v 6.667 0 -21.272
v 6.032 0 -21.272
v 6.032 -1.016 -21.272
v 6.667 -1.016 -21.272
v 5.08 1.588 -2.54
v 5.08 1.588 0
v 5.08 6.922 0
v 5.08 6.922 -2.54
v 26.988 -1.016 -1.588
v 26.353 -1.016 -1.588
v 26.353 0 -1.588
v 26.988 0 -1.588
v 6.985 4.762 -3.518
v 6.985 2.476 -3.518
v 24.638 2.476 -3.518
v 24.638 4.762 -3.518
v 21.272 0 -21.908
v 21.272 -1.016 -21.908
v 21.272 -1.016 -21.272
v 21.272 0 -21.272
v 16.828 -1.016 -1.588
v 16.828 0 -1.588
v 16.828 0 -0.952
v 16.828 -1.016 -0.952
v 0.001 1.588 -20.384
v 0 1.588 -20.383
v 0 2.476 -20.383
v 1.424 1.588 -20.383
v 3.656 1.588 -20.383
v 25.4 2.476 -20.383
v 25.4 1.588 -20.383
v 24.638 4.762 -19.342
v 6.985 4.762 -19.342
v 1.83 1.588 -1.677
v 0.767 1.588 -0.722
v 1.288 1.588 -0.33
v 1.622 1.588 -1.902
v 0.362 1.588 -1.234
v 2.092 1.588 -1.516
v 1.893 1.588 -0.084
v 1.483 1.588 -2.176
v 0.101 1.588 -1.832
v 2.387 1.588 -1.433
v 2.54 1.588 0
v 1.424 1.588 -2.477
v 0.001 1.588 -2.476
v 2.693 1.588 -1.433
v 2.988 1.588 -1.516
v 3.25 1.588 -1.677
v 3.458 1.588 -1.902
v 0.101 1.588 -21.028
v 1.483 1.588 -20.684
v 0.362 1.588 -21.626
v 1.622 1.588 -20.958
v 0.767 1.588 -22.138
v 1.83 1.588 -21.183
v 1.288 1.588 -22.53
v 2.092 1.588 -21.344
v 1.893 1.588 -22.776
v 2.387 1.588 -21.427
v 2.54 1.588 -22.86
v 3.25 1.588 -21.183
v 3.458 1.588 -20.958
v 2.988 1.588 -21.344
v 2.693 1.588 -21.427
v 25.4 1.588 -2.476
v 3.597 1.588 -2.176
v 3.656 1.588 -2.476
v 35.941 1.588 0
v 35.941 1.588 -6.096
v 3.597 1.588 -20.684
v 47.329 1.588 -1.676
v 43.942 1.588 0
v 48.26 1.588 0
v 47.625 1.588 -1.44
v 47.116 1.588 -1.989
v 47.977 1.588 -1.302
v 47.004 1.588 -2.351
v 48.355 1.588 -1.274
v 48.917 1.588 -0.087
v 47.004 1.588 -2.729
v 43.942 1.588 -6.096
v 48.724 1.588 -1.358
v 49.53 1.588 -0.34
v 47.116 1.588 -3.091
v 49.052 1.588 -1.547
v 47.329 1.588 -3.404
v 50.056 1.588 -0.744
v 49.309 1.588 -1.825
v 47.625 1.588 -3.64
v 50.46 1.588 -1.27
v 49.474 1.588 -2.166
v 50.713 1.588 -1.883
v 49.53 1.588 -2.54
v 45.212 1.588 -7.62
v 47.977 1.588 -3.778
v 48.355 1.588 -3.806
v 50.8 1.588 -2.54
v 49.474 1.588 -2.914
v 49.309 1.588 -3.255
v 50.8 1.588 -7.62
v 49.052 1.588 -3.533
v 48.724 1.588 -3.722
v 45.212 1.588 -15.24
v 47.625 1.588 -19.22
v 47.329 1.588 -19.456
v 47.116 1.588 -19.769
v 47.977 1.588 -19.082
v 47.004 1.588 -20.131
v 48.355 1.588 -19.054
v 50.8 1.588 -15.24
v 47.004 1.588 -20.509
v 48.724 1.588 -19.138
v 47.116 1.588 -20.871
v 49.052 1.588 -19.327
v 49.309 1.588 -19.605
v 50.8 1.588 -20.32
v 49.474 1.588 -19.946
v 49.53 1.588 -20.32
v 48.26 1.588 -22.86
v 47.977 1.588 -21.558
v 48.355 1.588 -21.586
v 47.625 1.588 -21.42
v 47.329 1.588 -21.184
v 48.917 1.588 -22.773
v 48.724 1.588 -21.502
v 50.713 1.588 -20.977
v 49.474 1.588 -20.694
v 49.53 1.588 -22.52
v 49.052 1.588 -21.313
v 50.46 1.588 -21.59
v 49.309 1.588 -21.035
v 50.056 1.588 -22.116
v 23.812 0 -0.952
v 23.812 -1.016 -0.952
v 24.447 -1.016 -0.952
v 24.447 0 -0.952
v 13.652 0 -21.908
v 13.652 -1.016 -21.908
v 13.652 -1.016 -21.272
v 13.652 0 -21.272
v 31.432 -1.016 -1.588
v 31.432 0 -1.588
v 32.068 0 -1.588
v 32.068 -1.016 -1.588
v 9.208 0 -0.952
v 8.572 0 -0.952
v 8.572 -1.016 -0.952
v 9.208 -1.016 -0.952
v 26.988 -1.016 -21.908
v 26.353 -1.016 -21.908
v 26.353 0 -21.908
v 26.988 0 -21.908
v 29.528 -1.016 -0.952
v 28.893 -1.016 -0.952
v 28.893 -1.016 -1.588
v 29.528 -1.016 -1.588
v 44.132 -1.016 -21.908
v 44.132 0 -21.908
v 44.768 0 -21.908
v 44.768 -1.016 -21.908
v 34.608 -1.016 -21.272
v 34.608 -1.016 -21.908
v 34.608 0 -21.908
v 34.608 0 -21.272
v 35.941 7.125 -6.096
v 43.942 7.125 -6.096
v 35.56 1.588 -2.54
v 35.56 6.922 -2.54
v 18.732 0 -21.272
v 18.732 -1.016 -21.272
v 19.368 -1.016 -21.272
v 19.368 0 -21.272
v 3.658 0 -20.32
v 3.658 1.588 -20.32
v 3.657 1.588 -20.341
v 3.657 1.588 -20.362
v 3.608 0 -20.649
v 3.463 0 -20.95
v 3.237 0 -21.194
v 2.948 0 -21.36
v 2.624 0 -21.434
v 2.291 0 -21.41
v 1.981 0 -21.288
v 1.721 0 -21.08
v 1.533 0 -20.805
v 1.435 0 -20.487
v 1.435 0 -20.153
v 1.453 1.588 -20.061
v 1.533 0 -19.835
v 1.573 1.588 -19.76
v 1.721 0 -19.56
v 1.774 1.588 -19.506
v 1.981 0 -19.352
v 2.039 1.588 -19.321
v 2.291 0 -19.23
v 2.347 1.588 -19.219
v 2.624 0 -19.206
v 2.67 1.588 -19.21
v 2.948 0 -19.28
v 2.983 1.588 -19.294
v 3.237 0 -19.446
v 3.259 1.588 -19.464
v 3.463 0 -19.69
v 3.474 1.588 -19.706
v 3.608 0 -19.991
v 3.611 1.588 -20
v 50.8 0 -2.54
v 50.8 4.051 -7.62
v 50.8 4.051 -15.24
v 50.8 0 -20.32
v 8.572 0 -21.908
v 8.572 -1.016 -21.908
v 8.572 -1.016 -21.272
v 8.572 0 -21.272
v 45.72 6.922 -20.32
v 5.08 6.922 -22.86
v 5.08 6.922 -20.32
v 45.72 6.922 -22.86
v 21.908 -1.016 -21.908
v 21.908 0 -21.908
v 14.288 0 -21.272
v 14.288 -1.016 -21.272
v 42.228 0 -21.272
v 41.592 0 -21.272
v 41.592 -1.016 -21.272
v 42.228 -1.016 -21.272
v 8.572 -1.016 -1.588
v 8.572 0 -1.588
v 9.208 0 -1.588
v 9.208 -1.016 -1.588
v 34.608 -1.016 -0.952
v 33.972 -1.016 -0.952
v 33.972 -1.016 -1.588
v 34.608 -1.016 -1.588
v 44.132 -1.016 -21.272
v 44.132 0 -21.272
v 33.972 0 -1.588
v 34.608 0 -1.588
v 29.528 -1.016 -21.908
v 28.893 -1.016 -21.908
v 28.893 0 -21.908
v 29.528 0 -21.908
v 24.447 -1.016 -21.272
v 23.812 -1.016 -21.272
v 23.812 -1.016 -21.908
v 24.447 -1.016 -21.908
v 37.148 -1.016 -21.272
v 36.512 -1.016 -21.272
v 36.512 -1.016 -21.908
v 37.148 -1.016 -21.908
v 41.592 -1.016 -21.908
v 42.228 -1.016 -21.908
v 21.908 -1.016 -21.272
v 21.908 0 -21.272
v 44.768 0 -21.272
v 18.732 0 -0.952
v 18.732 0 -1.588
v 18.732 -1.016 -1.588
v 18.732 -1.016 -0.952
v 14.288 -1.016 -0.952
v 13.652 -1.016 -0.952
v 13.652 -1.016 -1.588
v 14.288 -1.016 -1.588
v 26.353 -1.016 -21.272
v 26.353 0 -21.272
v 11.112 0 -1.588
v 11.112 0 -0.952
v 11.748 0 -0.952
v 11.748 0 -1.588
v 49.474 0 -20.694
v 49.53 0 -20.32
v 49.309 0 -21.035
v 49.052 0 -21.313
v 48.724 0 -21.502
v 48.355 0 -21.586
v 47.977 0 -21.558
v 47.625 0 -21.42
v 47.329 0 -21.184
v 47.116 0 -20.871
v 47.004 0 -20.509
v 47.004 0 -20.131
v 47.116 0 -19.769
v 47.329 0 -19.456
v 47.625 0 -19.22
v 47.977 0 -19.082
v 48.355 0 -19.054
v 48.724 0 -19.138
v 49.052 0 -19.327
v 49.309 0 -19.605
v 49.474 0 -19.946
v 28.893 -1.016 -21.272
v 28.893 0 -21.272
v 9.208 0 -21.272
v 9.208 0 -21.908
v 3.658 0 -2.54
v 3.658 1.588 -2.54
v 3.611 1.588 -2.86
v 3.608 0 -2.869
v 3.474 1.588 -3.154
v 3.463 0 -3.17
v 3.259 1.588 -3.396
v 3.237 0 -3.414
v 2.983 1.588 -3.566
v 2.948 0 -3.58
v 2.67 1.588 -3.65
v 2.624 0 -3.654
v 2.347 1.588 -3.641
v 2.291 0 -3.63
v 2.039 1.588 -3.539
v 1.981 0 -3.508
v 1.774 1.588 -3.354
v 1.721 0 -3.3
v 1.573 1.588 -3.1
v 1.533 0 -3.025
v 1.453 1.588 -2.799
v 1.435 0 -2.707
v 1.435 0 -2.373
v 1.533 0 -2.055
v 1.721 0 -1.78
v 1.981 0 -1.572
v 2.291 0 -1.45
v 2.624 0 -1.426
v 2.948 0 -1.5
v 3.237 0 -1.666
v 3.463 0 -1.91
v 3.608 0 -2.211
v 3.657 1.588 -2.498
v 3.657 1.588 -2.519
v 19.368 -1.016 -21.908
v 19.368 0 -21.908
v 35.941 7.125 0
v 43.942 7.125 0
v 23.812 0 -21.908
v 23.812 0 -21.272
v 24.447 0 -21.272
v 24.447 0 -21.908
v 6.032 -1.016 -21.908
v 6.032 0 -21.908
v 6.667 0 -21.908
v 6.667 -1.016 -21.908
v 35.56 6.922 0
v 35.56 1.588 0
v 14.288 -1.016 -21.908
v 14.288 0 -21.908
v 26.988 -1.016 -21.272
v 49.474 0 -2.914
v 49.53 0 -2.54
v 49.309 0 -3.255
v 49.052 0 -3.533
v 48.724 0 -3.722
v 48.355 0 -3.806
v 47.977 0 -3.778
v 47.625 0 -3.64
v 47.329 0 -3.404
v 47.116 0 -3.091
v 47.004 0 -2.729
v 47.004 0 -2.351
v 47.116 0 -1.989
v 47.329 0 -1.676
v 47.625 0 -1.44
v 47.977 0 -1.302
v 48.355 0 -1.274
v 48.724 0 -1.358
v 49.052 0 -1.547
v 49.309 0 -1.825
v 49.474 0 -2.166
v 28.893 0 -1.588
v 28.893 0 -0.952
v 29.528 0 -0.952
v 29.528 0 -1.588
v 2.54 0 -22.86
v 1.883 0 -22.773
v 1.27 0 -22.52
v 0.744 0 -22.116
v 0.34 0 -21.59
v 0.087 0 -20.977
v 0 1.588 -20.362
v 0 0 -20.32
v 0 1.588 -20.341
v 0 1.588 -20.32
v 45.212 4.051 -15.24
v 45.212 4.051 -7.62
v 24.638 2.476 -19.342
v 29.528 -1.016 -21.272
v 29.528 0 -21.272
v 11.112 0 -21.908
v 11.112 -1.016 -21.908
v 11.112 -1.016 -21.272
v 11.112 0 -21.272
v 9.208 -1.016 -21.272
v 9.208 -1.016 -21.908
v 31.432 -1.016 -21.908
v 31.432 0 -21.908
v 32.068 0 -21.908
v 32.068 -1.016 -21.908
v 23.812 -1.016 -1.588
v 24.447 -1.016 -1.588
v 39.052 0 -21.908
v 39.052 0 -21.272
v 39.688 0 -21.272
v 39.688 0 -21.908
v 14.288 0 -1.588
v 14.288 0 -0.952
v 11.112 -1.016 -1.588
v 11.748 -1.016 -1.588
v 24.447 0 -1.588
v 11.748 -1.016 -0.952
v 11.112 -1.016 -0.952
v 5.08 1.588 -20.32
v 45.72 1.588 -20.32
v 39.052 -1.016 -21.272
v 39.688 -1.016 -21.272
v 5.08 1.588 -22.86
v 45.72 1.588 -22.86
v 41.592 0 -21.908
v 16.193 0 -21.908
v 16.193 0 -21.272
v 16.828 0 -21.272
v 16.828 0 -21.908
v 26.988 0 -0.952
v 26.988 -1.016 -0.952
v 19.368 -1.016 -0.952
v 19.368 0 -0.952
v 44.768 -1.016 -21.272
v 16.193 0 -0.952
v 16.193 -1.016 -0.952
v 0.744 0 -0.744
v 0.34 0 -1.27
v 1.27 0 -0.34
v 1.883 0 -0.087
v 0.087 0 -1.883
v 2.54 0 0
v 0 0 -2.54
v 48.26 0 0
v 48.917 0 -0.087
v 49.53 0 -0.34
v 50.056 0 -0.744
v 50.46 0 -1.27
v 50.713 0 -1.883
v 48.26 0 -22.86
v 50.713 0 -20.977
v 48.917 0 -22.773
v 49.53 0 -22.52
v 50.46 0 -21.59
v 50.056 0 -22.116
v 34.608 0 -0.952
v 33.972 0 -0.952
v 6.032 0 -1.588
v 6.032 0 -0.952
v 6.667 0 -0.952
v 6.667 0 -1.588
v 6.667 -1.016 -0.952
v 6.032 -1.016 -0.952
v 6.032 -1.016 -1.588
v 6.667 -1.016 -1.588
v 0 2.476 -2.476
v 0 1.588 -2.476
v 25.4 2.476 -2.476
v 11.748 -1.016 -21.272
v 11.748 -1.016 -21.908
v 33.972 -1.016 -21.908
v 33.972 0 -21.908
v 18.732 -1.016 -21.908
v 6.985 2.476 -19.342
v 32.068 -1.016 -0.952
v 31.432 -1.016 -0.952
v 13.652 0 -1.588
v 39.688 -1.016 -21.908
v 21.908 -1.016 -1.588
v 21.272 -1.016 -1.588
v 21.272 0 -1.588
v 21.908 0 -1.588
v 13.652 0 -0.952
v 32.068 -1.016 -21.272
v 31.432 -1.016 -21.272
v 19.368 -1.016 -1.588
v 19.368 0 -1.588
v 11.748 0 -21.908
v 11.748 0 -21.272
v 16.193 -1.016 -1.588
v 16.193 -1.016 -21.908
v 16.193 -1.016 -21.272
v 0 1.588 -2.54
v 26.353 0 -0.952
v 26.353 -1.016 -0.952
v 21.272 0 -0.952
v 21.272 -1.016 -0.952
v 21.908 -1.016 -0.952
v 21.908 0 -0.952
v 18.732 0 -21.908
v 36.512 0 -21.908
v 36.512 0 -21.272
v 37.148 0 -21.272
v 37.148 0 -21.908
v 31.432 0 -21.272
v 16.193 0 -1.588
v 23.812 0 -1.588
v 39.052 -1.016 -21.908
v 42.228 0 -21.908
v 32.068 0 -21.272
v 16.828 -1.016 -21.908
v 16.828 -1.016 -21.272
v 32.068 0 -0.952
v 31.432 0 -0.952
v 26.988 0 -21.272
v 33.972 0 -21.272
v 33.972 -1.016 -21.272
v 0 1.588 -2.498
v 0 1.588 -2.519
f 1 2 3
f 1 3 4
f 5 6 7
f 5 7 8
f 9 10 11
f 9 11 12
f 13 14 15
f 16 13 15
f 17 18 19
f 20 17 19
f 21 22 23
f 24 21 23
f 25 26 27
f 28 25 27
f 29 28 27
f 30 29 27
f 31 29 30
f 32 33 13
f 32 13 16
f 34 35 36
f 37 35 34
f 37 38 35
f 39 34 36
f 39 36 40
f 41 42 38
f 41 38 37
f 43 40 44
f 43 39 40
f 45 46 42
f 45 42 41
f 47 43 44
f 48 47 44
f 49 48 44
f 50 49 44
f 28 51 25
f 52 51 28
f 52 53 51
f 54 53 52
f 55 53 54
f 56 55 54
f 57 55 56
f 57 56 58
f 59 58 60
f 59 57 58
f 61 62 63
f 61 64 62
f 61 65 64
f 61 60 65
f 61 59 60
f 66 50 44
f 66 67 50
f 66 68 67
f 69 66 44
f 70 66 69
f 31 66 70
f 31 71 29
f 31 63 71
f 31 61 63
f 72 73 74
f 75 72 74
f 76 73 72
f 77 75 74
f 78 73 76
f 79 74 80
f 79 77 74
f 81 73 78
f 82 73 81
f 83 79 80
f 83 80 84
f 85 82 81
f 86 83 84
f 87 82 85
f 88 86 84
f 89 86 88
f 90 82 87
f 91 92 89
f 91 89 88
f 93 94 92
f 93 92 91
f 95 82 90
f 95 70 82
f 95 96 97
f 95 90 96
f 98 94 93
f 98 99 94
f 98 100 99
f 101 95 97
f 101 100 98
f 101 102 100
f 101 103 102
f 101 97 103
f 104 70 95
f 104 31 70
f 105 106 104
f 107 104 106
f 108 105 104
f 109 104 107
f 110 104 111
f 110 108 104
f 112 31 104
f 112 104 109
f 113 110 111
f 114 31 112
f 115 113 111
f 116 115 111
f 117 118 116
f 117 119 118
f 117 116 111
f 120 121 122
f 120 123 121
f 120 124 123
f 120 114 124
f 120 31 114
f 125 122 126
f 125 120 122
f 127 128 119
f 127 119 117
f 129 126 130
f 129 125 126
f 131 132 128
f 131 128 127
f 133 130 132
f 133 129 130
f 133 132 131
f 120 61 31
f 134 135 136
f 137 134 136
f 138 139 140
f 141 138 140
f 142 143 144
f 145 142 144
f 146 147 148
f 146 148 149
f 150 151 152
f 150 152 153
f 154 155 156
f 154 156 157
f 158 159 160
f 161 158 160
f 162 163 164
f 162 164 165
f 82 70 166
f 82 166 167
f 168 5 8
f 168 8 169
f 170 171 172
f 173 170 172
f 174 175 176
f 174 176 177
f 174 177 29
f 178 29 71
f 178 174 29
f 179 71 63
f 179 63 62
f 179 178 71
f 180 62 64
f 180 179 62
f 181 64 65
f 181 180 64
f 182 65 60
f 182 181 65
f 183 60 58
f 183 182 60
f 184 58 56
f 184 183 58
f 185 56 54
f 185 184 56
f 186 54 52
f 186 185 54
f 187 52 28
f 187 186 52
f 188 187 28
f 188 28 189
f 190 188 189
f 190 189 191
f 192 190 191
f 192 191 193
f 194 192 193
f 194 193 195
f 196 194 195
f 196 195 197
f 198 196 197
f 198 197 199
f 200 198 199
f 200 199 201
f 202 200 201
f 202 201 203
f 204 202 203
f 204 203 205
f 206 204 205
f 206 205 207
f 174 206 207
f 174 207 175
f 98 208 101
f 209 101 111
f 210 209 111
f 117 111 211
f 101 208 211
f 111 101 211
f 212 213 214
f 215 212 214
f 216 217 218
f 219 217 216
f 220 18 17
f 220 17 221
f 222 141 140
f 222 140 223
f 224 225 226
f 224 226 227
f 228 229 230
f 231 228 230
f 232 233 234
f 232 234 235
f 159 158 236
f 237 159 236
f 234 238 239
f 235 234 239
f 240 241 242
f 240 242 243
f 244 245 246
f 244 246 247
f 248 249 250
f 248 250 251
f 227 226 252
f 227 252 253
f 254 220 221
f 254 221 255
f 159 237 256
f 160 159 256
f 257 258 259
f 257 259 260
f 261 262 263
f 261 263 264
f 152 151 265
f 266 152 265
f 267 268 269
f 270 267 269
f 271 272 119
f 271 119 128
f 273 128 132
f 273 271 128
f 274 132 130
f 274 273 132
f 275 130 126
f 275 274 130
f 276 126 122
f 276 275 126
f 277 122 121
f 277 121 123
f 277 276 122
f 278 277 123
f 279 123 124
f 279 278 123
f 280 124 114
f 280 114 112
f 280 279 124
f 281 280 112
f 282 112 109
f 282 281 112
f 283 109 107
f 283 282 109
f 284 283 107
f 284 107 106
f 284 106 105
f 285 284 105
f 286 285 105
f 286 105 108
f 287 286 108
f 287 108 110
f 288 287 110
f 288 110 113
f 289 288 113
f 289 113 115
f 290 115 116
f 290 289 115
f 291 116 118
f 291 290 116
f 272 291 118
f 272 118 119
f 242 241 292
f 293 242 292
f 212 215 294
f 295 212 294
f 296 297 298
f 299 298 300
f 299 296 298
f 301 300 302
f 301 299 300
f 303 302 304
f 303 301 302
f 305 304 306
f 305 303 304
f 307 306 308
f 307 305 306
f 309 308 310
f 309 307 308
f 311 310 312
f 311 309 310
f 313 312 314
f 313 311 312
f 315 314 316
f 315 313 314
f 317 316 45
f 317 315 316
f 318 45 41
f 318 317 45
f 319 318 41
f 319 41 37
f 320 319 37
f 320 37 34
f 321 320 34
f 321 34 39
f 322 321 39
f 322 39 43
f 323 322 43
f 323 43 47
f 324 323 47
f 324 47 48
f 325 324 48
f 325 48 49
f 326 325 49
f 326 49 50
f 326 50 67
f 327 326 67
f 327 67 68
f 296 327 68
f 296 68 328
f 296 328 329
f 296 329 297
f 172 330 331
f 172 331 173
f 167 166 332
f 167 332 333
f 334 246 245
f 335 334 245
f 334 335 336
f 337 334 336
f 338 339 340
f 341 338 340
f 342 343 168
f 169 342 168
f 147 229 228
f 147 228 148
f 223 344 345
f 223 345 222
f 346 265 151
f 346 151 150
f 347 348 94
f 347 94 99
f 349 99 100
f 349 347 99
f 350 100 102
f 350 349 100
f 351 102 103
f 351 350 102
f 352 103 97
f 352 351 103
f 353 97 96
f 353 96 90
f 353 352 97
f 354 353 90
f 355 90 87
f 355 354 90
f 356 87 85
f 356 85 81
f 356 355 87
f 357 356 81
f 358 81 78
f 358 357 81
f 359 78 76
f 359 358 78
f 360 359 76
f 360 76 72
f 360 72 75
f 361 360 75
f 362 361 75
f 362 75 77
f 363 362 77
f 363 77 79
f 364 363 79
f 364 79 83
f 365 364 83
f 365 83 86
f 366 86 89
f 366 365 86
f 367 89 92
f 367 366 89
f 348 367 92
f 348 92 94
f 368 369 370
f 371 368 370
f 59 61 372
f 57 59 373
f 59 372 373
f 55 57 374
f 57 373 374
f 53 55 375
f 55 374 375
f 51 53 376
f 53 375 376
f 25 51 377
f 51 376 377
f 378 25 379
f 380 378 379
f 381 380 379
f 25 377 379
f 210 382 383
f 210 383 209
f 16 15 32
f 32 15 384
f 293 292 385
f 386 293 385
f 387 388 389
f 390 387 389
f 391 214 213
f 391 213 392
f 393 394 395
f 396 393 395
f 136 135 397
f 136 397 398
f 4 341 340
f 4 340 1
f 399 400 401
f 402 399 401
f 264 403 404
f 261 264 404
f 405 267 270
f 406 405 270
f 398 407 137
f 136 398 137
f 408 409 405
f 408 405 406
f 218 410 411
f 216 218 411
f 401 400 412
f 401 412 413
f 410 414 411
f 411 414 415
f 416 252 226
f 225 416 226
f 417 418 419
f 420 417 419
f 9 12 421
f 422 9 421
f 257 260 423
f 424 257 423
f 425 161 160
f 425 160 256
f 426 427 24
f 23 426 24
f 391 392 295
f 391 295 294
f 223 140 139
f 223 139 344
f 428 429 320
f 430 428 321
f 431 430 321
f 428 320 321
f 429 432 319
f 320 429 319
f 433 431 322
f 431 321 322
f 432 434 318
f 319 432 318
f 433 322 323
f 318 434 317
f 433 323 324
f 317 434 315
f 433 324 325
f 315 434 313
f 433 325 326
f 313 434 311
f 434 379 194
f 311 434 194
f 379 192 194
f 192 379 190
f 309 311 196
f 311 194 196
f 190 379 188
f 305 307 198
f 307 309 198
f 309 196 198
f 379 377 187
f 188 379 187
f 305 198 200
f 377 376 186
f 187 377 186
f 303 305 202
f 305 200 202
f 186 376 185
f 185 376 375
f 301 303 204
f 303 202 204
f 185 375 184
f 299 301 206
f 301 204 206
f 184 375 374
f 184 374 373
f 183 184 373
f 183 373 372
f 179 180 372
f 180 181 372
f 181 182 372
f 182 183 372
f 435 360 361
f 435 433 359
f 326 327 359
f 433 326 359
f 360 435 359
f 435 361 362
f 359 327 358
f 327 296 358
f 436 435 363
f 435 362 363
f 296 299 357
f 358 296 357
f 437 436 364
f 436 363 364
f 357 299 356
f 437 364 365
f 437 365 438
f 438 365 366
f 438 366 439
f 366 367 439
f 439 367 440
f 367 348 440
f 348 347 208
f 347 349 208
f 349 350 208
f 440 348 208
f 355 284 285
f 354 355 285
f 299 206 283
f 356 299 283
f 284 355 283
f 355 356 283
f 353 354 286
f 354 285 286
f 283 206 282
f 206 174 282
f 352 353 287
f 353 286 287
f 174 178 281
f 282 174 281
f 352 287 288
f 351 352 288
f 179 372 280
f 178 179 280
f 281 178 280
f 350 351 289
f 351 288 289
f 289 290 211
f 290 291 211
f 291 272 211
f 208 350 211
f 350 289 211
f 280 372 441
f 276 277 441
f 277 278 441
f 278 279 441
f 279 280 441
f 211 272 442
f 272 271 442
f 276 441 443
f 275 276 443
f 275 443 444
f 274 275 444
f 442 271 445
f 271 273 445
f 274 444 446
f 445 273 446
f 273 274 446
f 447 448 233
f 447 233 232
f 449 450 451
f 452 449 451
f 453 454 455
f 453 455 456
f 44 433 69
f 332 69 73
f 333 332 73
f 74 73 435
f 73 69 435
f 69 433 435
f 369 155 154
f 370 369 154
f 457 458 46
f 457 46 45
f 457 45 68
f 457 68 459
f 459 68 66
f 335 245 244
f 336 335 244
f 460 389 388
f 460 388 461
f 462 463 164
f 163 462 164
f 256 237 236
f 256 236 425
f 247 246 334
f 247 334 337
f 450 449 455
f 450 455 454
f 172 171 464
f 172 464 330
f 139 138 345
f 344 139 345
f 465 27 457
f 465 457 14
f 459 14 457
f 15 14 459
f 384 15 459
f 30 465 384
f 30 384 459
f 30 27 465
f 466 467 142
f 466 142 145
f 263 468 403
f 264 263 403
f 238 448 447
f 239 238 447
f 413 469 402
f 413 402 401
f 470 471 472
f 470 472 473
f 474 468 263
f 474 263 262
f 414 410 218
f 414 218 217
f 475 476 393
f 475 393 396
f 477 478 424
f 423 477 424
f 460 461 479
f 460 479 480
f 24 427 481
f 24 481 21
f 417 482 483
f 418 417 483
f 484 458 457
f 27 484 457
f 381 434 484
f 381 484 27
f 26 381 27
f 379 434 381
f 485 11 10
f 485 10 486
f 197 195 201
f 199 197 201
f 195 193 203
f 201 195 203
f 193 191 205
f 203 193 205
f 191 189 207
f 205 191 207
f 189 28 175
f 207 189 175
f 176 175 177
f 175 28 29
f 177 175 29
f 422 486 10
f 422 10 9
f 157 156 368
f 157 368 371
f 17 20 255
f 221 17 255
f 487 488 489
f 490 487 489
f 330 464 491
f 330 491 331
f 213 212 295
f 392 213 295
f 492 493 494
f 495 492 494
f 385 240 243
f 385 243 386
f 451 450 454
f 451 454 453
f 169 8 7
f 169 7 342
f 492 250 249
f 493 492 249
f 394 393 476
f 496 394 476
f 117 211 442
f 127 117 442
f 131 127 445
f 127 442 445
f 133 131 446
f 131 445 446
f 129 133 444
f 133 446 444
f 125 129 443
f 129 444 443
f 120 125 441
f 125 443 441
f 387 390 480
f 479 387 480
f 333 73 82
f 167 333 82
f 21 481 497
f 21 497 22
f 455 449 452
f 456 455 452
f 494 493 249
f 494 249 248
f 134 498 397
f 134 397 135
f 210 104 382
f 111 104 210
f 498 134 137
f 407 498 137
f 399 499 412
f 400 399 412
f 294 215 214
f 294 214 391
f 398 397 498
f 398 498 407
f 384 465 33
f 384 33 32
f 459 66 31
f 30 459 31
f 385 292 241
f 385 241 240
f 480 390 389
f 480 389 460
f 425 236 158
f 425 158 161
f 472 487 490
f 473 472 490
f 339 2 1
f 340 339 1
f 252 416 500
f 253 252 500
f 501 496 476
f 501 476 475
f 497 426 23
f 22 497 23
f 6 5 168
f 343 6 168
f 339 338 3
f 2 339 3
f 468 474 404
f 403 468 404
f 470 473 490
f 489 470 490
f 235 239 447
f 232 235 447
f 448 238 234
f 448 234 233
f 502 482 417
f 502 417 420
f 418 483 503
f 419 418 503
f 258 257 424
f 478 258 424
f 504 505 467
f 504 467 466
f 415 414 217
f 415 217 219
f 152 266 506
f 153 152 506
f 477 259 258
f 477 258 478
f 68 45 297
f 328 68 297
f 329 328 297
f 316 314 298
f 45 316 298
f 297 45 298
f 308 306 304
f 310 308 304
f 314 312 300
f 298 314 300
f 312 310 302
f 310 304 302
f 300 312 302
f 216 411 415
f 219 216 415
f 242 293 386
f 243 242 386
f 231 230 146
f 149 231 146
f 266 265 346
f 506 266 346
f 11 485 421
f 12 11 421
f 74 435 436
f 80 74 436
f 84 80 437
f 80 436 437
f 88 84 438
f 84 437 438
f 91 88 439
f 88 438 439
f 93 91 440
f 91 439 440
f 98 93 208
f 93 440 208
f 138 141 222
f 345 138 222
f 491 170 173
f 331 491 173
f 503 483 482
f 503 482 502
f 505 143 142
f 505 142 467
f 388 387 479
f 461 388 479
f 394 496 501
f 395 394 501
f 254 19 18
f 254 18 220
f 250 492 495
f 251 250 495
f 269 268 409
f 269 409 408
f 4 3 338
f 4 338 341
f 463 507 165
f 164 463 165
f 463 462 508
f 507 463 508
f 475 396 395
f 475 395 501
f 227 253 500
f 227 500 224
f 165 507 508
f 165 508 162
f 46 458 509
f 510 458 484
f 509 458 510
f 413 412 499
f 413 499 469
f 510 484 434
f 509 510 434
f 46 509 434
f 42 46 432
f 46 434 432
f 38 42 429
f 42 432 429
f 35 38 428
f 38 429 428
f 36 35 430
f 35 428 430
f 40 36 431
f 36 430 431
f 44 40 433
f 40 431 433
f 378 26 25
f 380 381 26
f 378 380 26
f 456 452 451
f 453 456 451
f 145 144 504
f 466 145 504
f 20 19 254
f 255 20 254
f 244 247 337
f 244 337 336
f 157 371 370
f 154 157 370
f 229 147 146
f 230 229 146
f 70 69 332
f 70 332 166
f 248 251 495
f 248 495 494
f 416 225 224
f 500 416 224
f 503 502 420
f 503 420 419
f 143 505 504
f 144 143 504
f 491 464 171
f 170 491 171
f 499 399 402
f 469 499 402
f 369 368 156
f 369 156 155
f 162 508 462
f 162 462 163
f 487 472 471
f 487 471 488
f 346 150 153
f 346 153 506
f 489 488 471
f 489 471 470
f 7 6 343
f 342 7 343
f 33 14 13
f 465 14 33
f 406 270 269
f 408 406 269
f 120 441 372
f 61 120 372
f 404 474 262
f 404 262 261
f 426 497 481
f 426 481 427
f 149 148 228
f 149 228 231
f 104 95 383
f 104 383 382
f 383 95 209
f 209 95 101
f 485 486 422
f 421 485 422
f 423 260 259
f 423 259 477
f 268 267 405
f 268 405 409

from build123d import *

# Parameters (mm, degrees)
SKETCH1_R              = 1.27
SKETCH1_R_2            = 1.1176
BOSS_EXTRUDE1_DEPTH    = 1.5875
SKETCH2_W              = 25.4
SKETCH2_H              = 17.907
BOSS_EXTRUDE2_DEPTH    = 0.889
BOSS_EXTRUDE3_START    = 0.889
SKETCH2_3_W            = 17.653
SKETCH2_3_H            = 15.8242
BOSS_EXTRUDE3_DEPTH    = 2.286
SKETCH2_4_W            = 8.001
SKETCH2_4_H            = 6.096
BOSS_EXTRUDE4_DEPTH    = 5.5372
SKETCH2_5_W            = 5.588
SKETCH2_5_H            = 7.62
BOSS_EXTRUDE5_DEPTH    = 2.4638
SKETCH3_W              = 0.635
SKETCH3_H              = 0.635
BOSS_EXTRUDE6_DEPTH    = 1.016
BOSS_EXTRUDE6_2_DEPTH  = 1.016
BOSS_EXTRUDE6_3_DEPTH  = 1.016
BOSS_EXTRUDE6_4_DEPTH  = 1.016
BOSS_EXTRUDE6_5_DEPTH  = 1.016
BOSS_EXTRUDE6_6_DEPTH  = 1.016
BOSS_EXTRUDE6_7_DEPTH  = 1.016
BOSS_EXTRUDE6_8_DEPTH  = 1.016
BOSS_EXTRUDE6_9_DEPTH  = 1.016
BOSS_EXTRUDE6_10_DEPTH = 1.016
BOSS_EXTRUDE6_11_DEPTH = 1.016
BOSS_EXTRUDE6_12_DEPTH = 1.016
BOSS_EXTRUDE6_13_DEPTH = 1.016
BOSS_EXTRUDE6_14_DEPTH = 1.016
BOSS_EXTRUDE6_15_DEPTH = 1.016
BOSS_EXTRUDE6_16_DEPTH = 1.016
BOSS_EXTRUDE6_17_DEPTH = 1.016
BOSS_EXTRUDE6_18_DEPTH = 1.016
BOSS_EXTRUDE6_19_DEPTH = 1.016
BOSS_EXTRUDE6_20_DEPTH = 1.016
BOSS_EXTRUDE6_21_DEPTH = 1.016
BOSS_EXTRUDE6_22_DEPTH = 1.016
BOSS_EXTRUDE6_23_DEPTH = 1.016
BOSS_EXTRUDE6_24_DEPTH = 1.016
BOSS_EXTRUDE6_25_DEPTH = 1.016
BOSS_EXTRUDE6_26_DEPTH = 1.016
BOSS_EXTRUDE6_27_DEPTH = 1.016
BOSS_EXTRUDE6_28_DEPTH = 1.016
SKETCH4_W              = 30.48
SKETCH4_H              = 2.54
BOSS_EXTRUDE7_DEPTH    = 5.334
SKETCH4_W_2            = 40.64
BOSS_EXTRUDE7_2_DEPTH  = 5.334


with BuildPart() as part:
    # Sketch1 → Boss-Extrude1 (new body)
    with BuildSketch(Plane(origin=(0, 0, 0), x_dir=(1, 0, 0), z_dir=(0, 1, 0))):
        with BuildLine():
            Line((2.54, 0), (48.26, 0))
            ThreePointArc((48.26, 0), (50.056051224, 0.743948776), (50.8, 2.54))
            Line((50.8, 2.54), (50.8, 20.32))
            ThreePointArc((50.8, 20.32), (50.056051224, 22.116051224), (48.26, 22.86))
            Line((48.26, 22.86), (2.54, 22.86))
            ThreePointArc((2.54, 22.86), (0.743948776, 22.116051224), (0, 20.32))
            Line((0, 20.32), (0, 2.54))
            ThreePointArc((0, 2.54), (0.743948776, 0.743948776), (2.54, 0))
        make_face()
        with Locations((48.26, 20.32)):
            Circle(SKETCH1_R, mode=Mode.SUBTRACT)
        with Locations((48.26, 2.54)):
            Circle(SKETCH1_R, mode=Mode.SUBTRACT)
        with Locations((2.54, 20.32)):
            Circle(SKETCH1_R_2, mode=Mode.SUBTRACT)
        with Locations((2.54, 2.54)):
            Circle(SKETCH1_R_2, mode=Mode.SUBTRACT)
    extrude(amount=BOSS_EXTRUDE1_DEPTH)

    # Sketch2 → Boss-Extrude2 (add)
    with BuildSketch(Plane(origin=(0, 1.5875, 1.5875), x_dir=(1, 0, 0), z_dir=(0, 1, 0))):
        with Locations((12.7, 13.0175)):
            Rectangle(SKETCH2_W, SKETCH2_H)
    extrude(amount=BOSS_EXTRUDE2_DEPTH)

    # Sketch2<3> → Boss-Extrude3 (add)
    with BuildSketch(Plane(origin=(0, 1.5875, 1.5875), x_dir=(1, 0, 0), z_dir=(0, 1, 0)).offset(BOSS_EXTRUDE3_START)):
        with Locations((15.8115, 13.0175)):
            Rectangle(SKETCH2_3_W, SKETCH2_3_H)
    extrude(amount=BOSS_EXTRUDE3_DEPTH)

    # Sketch2<4> → Boss-Extrude4 (add)
    with BuildSketch(Plane(origin=(0, 1.5875, 1.5875), x_dir=(1, 0, 0), z_dir=(0, 1, 0))):
        with Locations((39.9415, 4.6355)):
            Rectangle(SKETCH2_4_W, SKETCH2_4_H)
    extrude(amount=BOSS_EXTRUDE4_DEPTH)

    # Sketch2<5> → Boss-Extrude5 (add)
    with BuildSketch(Plane(origin=(0, 1.5875, 1.5875), x_dir=(1, 0, 0), z_dir=(0, 1, 0))):
        with Locations((48.006, 13.0175)):
            Rectangle(SKETCH2_5_W, SKETCH2_5_H)
    extrude(amount=BOSS_EXTRUDE5_DEPTH)


with BuildPart() as body_2:
    # Sketch3 → Boss-Extrude6 (new body)
    with BuildSketch(Plane.XZ):
        with Locations((8.89, -21.59)):
            Rectangle(SKETCH3_W, SKETCH3_H)
    extrude(amount=BOSS_EXTRUDE6_DEPTH)


with BuildPart() as body_3:
    # Sketch3 → Boss-Extrude6 2 (new body)
    with BuildSketch(Plane.XZ):
        with Locations((6.35, -21.59)):
            Rectangle(SKETCH3_W, SKETCH3_H)
    extrude(amount=BOSS_EXTRUDE6_2_DEPTH)


with BuildPart() as body_4:
    # Sketch3 → Boss-Extrude6 3 (new body)
    with BuildSketch(Plane.XZ):
        with Locations((11.43, -21.59)):
            Rectangle(SKETCH3_W, SKETCH3_H)
    extrude(amount=BOSS_EXTRUDE6_3_DEPTH)


with BuildPart() as body_5:
    # Sketch3 → Boss-Extrude6 4 (new body)
    with BuildSketch(Plane.XZ):
        with Locations((13.97, -21.59)):
            Rectangle(SKETCH3_W, SKETCH3_H)
    extrude(amount=BOSS_EXTRUDE6_4_DEPTH)


with BuildPart() as body_6:
    # Sketch3 → Boss-Extrude6 5 (new body)
    with BuildSketch(Plane.XZ):
        with Locations((16.51, -21.59)):
            Rectangle(SKETCH3_W, SKETCH3_H)
    extrude(amount=BOSS_EXTRUDE6_5_DEPTH)


with BuildPart() as body_7:
    # Sketch3 → Boss-Extrude6 6 (new body)
    with BuildSketch(Plane.XZ):
        with Locations((19.05, -21.59)):
            Rectangle(SKETCH3_W, SKETCH3_H)
    extrude(amount=BOSS_EXTRUDE6_6_DEPTH)


with BuildPart() as body_8:
    # Sketch3 → Boss-Extrude6 7 (new body)
    with BuildSketch(Plane.XZ):
        with Locations((21.59, -21.59)):
            Rectangle(SKETCH3_W, SKETCH3_H)
    extrude(amount=BOSS_EXTRUDE6_7_DEPTH)


with BuildPart() as body_9:
    # Sketch3 → Boss-Extrude6 8 (new body)
    with BuildSketch(Plane.XZ):
        with Locations((24.13, -21.59)):
            Rectangle(SKETCH3_W, SKETCH3_H)
    extrude(amount=BOSS_EXTRUDE6_8_DEPTH)


with BuildPart() as body_10:
    # Sketch3 → Boss-Extrude6 9 (new body)
    with BuildSketch(Plane.XZ):
        with Locations((26.67, -21.59)):
            Rectangle(SKETCH3_W, SKETCH3_H)
    extrude(amount=BOSS_EXTRUDE6_9_DEPTH)


with BuildPart() as body_11:
    # Sketch3 → Boss-Extrude6 10 (new body)
    with BuildSketch(Plane.XZ):
        with Locations((29.21, -21.59)):
            Rectangle(SKETCH3_W, SKETCH3_H)
    extrude(amount=BOSS_EXTRUDE6_10_DEPTH)


with BuildPart() as body_12:
    # Sketch3 → Boss-Extrude6 11 (new body)
    with BuildSketch(Plane.XZ):
        with Locations((31.75, -21.59)):
            Rectangle(SKETCH3_W, SKETCH3_H)
    extrude(amount=BOSS_EXTRUDE6_11_DEPTH)


with BuildPart() as body_13:
    # Sketch3 → Boss-Extrude6 12 (new body)
    with BuildSketch(Plane.XZ):
        with Locations((34.29, -21.59)):
            Rectangle(SKETCH3_W, SKETCH3_H)
    extrude(amount=BOSS_EXTRUDE6_12_DEPTH)


with BuildPart() as body_14:
    # Sketch3 → Boss-Extrude6 13 (new body)
    with BuildSketch(Plane.XZ):
        with Locations((36.83, -21.59)):
            Rectangle(SKETCH3_W, SKETCH3_H)
    extrude(amount=BOSS_EXTRUDE6_13_DEPTH)


with BuildPart() as body_15:
    # Sketch3 → Boss-Extrude6 14 (new body)
    with BuildSketch(Plane.XZ):
        with Locations((39.37, -21.59)):
            Rectangle(SKETCH3_W, SKETCH3_H)
    extrude(amount=BOSS_EXTRUDE6_14_DEPTH)


with BuildPart() as body_16:
    # Sketch3 → Boss-Extrude6 15 (new body)
    with BuildSketch(Plane.XZ):
        with Locations((41.91, -21.59)):
            Rectangle(SKETCH3_W, SKETCH3_H)
    extrude(amount=BOSS_EXTRUDE6_15_DEPTH)


with BuildPart() as body_17:
    # Sketch3 → Boss-Extrude6 16 (new body)
    with BuildSketch(Plane.XZ):
        with Locations((44.45, -21.59)):
            Rectangle(SKETCH3_W, SKETCH3_H)
    extrude(amount=BOSS_EXTRUDE6_16_DEPTH)


with BuildPart() as body_18:
    # Sketch3 → Boss-Extrude6 17 (new body)
    with BuildSketch(Plane.XZ):
        with Locations((8.89, -1.27)):
            Rectangle(SKETCH3_W, SKETCH3_H)
    extrude(amount=BOSS_EXTRUDE6_17_DEPTH)


with BuildPart() as body_19:
    # Sketch3 → Boss-Extrude6 18 (new body)
    with BuildSketch(Plane.XZ):
        with Locations((6.35, -1.27)):
            Rectangle(SKETCH3_W, SKETCH3_H)
    extrude(amount=BOSS_EXTRUDE6_18_DEPTH)


with BuildPart() as body_20:
    # Sketch3 → Boss-Extrude6 19 (new body)
    with BuildSketch(Plane.XZ):
        with Locations((11.43, -1.27)):
            Rectangle(SKETCH3_W, SKETCH3_H)
    extrude(amount=BOSS_EXTRUDE6_19_DEPTH)


with BuildPart() as body_21:
    # Sketch3 → Boss-Extrude6 20 (new body)
    with BuildSketch(Plane.XZ):
        with Locations((13.97, -1.27)):
            Rectangle(SKETCH3_W, SKETCH3_H)
    extrude(amount=BOSS_EXTRUDE6_20_DEPTH)


with BuildPart() as body_22:
    # Sketch3 → Boss-Extrude6 21 (new body)
    with BuildSketch(Plane.XZ):
        with Locations((16.51, -1.27)):
            Rectangle(SKETCH3_W, SKETCH3_H)
    extrude(amount=BOSS_EXTRUDE6_21_DEPTH)


with BuildPart() as body_23:
    # Sketch3 → Boss-Extrude6 22 (new body)
    with BuildSketch(Plane.XZ):
        with Locations((19.05, -1.27)):
            Rectangle(SKETCH3_W, SKETCH3_H)
    extrude(amount=BOSS_EXTRUDE6_22_DEPTH)


with BuildPart() as body_24:
    # Sketch3 → Boss-Extrude6 23 (new body)
    with BuildSketch(Plane.XZ):
        with Locations((21.59, -1.27)):
            Rectangle(SKETCH3_W, SKETCH3_H)
    extrude(amount=BOSS_EXTRUDE6_23_DEPTH)


with BuildPart() as body_25:
    # Sketch3 → Boss-Extrude6 24 (new body)
    with BuildSketch(Plane.XZ):
        with Locations((24.13, -1.27)):
            Rectangle(SKETCH3_W, SKETCH3_H)
    extrude(amount=BOSS_EXTRUDE6_24_DEPTH)


with BuildPart() as body_26:
    # Sketch3 → Boss-Extrude6 25 (new body)
    with BuildSketch(Plane.XZ):
        with Locations((26.67, -1.27)):
            Rectangle(SKETCH3_W, SKETCH3_H)
    extrude(amount=BOSS_EXTRUDE6_25_DEPTH)


with BuildPart() as body_27:
    # Sketch3 → Boss-Extrude6 26 (new body)
    with BuildSketch(Plane.XZ):
        with Locations((29.21, -1.27)):
            Rectangle(SKETCH3_W, SKETCH3_H)
    extrude(amount=BOSS_EXTRUDE6_26_DEPTH)


with BuildPart() as body_28:
    # Sketch3 → Boss-Extrude6 27 (new body)
    with BuildSketch(Plane.XZ):
        with Locations((31.75, -1.27)):
            Rectangle(SKETCH3_W, SKETCH3_H)
    extrude(amount=BOSS_EXTRUDE6_27_DEPTH)


with BuildPart() as body_29:
    # Sketch3 → Boss-Extrude6 28 (new body)
    with BuildSketch(Plane.XZ):
        with Locations((34.29, -1.27)):
            Rectangle(SKETCH3_W, SKETCH3_H)
    extrude(amount=BOSS_EXTRUDE6_28_DEPTH)


with BuildPart() as body_30:
    # Sketch4 → Boss-Extrude7 (new body)
    with BuildSketch(Plane(origin=(0, 1.5875, 0), x_dir=(1, 0, 0), z_dir=(0, 1, 0))):
        with Locations((20.32, 1.27)):
            Rectangle(SKETCH4_W, SKETCH4_H)
    extrude(amount=BOSS_EXTRUDE7_DEPTH)


with BuildPart() as body_31:
    # Sketch4 → Boss-Extrude7 2 (new body)
    with BuildSketch(Plane(origin=(0, 1.5875, 0), x_dir=(1, 0, 0), z_dir=(0, 1, 0))):
        with Locations((25.4, 21.59)):
            Rectangle(SKETCH4_W_2, SKETCH4_H)
    extrude(amount=BOSS_EXTRUDE7_2_DEPTH)


solid = Compound([part.part, body_2.part, body_3.part, body_4.part, body_5.part, body_6.part, body_7.part, body_8.part, body_9.part, body_10.part, body_11.part, body_12.part, body_13.part, body_14.part, body_15.part, body_16.part, body_17.part, body_18.part, body_19.part, body_20.part, body_21.part, body_22.part, body_23.part, body_24.part, body_25.part, body_26.part, body_27.part, body_28.part, body_29.part, body_30.part, body_31.part])
